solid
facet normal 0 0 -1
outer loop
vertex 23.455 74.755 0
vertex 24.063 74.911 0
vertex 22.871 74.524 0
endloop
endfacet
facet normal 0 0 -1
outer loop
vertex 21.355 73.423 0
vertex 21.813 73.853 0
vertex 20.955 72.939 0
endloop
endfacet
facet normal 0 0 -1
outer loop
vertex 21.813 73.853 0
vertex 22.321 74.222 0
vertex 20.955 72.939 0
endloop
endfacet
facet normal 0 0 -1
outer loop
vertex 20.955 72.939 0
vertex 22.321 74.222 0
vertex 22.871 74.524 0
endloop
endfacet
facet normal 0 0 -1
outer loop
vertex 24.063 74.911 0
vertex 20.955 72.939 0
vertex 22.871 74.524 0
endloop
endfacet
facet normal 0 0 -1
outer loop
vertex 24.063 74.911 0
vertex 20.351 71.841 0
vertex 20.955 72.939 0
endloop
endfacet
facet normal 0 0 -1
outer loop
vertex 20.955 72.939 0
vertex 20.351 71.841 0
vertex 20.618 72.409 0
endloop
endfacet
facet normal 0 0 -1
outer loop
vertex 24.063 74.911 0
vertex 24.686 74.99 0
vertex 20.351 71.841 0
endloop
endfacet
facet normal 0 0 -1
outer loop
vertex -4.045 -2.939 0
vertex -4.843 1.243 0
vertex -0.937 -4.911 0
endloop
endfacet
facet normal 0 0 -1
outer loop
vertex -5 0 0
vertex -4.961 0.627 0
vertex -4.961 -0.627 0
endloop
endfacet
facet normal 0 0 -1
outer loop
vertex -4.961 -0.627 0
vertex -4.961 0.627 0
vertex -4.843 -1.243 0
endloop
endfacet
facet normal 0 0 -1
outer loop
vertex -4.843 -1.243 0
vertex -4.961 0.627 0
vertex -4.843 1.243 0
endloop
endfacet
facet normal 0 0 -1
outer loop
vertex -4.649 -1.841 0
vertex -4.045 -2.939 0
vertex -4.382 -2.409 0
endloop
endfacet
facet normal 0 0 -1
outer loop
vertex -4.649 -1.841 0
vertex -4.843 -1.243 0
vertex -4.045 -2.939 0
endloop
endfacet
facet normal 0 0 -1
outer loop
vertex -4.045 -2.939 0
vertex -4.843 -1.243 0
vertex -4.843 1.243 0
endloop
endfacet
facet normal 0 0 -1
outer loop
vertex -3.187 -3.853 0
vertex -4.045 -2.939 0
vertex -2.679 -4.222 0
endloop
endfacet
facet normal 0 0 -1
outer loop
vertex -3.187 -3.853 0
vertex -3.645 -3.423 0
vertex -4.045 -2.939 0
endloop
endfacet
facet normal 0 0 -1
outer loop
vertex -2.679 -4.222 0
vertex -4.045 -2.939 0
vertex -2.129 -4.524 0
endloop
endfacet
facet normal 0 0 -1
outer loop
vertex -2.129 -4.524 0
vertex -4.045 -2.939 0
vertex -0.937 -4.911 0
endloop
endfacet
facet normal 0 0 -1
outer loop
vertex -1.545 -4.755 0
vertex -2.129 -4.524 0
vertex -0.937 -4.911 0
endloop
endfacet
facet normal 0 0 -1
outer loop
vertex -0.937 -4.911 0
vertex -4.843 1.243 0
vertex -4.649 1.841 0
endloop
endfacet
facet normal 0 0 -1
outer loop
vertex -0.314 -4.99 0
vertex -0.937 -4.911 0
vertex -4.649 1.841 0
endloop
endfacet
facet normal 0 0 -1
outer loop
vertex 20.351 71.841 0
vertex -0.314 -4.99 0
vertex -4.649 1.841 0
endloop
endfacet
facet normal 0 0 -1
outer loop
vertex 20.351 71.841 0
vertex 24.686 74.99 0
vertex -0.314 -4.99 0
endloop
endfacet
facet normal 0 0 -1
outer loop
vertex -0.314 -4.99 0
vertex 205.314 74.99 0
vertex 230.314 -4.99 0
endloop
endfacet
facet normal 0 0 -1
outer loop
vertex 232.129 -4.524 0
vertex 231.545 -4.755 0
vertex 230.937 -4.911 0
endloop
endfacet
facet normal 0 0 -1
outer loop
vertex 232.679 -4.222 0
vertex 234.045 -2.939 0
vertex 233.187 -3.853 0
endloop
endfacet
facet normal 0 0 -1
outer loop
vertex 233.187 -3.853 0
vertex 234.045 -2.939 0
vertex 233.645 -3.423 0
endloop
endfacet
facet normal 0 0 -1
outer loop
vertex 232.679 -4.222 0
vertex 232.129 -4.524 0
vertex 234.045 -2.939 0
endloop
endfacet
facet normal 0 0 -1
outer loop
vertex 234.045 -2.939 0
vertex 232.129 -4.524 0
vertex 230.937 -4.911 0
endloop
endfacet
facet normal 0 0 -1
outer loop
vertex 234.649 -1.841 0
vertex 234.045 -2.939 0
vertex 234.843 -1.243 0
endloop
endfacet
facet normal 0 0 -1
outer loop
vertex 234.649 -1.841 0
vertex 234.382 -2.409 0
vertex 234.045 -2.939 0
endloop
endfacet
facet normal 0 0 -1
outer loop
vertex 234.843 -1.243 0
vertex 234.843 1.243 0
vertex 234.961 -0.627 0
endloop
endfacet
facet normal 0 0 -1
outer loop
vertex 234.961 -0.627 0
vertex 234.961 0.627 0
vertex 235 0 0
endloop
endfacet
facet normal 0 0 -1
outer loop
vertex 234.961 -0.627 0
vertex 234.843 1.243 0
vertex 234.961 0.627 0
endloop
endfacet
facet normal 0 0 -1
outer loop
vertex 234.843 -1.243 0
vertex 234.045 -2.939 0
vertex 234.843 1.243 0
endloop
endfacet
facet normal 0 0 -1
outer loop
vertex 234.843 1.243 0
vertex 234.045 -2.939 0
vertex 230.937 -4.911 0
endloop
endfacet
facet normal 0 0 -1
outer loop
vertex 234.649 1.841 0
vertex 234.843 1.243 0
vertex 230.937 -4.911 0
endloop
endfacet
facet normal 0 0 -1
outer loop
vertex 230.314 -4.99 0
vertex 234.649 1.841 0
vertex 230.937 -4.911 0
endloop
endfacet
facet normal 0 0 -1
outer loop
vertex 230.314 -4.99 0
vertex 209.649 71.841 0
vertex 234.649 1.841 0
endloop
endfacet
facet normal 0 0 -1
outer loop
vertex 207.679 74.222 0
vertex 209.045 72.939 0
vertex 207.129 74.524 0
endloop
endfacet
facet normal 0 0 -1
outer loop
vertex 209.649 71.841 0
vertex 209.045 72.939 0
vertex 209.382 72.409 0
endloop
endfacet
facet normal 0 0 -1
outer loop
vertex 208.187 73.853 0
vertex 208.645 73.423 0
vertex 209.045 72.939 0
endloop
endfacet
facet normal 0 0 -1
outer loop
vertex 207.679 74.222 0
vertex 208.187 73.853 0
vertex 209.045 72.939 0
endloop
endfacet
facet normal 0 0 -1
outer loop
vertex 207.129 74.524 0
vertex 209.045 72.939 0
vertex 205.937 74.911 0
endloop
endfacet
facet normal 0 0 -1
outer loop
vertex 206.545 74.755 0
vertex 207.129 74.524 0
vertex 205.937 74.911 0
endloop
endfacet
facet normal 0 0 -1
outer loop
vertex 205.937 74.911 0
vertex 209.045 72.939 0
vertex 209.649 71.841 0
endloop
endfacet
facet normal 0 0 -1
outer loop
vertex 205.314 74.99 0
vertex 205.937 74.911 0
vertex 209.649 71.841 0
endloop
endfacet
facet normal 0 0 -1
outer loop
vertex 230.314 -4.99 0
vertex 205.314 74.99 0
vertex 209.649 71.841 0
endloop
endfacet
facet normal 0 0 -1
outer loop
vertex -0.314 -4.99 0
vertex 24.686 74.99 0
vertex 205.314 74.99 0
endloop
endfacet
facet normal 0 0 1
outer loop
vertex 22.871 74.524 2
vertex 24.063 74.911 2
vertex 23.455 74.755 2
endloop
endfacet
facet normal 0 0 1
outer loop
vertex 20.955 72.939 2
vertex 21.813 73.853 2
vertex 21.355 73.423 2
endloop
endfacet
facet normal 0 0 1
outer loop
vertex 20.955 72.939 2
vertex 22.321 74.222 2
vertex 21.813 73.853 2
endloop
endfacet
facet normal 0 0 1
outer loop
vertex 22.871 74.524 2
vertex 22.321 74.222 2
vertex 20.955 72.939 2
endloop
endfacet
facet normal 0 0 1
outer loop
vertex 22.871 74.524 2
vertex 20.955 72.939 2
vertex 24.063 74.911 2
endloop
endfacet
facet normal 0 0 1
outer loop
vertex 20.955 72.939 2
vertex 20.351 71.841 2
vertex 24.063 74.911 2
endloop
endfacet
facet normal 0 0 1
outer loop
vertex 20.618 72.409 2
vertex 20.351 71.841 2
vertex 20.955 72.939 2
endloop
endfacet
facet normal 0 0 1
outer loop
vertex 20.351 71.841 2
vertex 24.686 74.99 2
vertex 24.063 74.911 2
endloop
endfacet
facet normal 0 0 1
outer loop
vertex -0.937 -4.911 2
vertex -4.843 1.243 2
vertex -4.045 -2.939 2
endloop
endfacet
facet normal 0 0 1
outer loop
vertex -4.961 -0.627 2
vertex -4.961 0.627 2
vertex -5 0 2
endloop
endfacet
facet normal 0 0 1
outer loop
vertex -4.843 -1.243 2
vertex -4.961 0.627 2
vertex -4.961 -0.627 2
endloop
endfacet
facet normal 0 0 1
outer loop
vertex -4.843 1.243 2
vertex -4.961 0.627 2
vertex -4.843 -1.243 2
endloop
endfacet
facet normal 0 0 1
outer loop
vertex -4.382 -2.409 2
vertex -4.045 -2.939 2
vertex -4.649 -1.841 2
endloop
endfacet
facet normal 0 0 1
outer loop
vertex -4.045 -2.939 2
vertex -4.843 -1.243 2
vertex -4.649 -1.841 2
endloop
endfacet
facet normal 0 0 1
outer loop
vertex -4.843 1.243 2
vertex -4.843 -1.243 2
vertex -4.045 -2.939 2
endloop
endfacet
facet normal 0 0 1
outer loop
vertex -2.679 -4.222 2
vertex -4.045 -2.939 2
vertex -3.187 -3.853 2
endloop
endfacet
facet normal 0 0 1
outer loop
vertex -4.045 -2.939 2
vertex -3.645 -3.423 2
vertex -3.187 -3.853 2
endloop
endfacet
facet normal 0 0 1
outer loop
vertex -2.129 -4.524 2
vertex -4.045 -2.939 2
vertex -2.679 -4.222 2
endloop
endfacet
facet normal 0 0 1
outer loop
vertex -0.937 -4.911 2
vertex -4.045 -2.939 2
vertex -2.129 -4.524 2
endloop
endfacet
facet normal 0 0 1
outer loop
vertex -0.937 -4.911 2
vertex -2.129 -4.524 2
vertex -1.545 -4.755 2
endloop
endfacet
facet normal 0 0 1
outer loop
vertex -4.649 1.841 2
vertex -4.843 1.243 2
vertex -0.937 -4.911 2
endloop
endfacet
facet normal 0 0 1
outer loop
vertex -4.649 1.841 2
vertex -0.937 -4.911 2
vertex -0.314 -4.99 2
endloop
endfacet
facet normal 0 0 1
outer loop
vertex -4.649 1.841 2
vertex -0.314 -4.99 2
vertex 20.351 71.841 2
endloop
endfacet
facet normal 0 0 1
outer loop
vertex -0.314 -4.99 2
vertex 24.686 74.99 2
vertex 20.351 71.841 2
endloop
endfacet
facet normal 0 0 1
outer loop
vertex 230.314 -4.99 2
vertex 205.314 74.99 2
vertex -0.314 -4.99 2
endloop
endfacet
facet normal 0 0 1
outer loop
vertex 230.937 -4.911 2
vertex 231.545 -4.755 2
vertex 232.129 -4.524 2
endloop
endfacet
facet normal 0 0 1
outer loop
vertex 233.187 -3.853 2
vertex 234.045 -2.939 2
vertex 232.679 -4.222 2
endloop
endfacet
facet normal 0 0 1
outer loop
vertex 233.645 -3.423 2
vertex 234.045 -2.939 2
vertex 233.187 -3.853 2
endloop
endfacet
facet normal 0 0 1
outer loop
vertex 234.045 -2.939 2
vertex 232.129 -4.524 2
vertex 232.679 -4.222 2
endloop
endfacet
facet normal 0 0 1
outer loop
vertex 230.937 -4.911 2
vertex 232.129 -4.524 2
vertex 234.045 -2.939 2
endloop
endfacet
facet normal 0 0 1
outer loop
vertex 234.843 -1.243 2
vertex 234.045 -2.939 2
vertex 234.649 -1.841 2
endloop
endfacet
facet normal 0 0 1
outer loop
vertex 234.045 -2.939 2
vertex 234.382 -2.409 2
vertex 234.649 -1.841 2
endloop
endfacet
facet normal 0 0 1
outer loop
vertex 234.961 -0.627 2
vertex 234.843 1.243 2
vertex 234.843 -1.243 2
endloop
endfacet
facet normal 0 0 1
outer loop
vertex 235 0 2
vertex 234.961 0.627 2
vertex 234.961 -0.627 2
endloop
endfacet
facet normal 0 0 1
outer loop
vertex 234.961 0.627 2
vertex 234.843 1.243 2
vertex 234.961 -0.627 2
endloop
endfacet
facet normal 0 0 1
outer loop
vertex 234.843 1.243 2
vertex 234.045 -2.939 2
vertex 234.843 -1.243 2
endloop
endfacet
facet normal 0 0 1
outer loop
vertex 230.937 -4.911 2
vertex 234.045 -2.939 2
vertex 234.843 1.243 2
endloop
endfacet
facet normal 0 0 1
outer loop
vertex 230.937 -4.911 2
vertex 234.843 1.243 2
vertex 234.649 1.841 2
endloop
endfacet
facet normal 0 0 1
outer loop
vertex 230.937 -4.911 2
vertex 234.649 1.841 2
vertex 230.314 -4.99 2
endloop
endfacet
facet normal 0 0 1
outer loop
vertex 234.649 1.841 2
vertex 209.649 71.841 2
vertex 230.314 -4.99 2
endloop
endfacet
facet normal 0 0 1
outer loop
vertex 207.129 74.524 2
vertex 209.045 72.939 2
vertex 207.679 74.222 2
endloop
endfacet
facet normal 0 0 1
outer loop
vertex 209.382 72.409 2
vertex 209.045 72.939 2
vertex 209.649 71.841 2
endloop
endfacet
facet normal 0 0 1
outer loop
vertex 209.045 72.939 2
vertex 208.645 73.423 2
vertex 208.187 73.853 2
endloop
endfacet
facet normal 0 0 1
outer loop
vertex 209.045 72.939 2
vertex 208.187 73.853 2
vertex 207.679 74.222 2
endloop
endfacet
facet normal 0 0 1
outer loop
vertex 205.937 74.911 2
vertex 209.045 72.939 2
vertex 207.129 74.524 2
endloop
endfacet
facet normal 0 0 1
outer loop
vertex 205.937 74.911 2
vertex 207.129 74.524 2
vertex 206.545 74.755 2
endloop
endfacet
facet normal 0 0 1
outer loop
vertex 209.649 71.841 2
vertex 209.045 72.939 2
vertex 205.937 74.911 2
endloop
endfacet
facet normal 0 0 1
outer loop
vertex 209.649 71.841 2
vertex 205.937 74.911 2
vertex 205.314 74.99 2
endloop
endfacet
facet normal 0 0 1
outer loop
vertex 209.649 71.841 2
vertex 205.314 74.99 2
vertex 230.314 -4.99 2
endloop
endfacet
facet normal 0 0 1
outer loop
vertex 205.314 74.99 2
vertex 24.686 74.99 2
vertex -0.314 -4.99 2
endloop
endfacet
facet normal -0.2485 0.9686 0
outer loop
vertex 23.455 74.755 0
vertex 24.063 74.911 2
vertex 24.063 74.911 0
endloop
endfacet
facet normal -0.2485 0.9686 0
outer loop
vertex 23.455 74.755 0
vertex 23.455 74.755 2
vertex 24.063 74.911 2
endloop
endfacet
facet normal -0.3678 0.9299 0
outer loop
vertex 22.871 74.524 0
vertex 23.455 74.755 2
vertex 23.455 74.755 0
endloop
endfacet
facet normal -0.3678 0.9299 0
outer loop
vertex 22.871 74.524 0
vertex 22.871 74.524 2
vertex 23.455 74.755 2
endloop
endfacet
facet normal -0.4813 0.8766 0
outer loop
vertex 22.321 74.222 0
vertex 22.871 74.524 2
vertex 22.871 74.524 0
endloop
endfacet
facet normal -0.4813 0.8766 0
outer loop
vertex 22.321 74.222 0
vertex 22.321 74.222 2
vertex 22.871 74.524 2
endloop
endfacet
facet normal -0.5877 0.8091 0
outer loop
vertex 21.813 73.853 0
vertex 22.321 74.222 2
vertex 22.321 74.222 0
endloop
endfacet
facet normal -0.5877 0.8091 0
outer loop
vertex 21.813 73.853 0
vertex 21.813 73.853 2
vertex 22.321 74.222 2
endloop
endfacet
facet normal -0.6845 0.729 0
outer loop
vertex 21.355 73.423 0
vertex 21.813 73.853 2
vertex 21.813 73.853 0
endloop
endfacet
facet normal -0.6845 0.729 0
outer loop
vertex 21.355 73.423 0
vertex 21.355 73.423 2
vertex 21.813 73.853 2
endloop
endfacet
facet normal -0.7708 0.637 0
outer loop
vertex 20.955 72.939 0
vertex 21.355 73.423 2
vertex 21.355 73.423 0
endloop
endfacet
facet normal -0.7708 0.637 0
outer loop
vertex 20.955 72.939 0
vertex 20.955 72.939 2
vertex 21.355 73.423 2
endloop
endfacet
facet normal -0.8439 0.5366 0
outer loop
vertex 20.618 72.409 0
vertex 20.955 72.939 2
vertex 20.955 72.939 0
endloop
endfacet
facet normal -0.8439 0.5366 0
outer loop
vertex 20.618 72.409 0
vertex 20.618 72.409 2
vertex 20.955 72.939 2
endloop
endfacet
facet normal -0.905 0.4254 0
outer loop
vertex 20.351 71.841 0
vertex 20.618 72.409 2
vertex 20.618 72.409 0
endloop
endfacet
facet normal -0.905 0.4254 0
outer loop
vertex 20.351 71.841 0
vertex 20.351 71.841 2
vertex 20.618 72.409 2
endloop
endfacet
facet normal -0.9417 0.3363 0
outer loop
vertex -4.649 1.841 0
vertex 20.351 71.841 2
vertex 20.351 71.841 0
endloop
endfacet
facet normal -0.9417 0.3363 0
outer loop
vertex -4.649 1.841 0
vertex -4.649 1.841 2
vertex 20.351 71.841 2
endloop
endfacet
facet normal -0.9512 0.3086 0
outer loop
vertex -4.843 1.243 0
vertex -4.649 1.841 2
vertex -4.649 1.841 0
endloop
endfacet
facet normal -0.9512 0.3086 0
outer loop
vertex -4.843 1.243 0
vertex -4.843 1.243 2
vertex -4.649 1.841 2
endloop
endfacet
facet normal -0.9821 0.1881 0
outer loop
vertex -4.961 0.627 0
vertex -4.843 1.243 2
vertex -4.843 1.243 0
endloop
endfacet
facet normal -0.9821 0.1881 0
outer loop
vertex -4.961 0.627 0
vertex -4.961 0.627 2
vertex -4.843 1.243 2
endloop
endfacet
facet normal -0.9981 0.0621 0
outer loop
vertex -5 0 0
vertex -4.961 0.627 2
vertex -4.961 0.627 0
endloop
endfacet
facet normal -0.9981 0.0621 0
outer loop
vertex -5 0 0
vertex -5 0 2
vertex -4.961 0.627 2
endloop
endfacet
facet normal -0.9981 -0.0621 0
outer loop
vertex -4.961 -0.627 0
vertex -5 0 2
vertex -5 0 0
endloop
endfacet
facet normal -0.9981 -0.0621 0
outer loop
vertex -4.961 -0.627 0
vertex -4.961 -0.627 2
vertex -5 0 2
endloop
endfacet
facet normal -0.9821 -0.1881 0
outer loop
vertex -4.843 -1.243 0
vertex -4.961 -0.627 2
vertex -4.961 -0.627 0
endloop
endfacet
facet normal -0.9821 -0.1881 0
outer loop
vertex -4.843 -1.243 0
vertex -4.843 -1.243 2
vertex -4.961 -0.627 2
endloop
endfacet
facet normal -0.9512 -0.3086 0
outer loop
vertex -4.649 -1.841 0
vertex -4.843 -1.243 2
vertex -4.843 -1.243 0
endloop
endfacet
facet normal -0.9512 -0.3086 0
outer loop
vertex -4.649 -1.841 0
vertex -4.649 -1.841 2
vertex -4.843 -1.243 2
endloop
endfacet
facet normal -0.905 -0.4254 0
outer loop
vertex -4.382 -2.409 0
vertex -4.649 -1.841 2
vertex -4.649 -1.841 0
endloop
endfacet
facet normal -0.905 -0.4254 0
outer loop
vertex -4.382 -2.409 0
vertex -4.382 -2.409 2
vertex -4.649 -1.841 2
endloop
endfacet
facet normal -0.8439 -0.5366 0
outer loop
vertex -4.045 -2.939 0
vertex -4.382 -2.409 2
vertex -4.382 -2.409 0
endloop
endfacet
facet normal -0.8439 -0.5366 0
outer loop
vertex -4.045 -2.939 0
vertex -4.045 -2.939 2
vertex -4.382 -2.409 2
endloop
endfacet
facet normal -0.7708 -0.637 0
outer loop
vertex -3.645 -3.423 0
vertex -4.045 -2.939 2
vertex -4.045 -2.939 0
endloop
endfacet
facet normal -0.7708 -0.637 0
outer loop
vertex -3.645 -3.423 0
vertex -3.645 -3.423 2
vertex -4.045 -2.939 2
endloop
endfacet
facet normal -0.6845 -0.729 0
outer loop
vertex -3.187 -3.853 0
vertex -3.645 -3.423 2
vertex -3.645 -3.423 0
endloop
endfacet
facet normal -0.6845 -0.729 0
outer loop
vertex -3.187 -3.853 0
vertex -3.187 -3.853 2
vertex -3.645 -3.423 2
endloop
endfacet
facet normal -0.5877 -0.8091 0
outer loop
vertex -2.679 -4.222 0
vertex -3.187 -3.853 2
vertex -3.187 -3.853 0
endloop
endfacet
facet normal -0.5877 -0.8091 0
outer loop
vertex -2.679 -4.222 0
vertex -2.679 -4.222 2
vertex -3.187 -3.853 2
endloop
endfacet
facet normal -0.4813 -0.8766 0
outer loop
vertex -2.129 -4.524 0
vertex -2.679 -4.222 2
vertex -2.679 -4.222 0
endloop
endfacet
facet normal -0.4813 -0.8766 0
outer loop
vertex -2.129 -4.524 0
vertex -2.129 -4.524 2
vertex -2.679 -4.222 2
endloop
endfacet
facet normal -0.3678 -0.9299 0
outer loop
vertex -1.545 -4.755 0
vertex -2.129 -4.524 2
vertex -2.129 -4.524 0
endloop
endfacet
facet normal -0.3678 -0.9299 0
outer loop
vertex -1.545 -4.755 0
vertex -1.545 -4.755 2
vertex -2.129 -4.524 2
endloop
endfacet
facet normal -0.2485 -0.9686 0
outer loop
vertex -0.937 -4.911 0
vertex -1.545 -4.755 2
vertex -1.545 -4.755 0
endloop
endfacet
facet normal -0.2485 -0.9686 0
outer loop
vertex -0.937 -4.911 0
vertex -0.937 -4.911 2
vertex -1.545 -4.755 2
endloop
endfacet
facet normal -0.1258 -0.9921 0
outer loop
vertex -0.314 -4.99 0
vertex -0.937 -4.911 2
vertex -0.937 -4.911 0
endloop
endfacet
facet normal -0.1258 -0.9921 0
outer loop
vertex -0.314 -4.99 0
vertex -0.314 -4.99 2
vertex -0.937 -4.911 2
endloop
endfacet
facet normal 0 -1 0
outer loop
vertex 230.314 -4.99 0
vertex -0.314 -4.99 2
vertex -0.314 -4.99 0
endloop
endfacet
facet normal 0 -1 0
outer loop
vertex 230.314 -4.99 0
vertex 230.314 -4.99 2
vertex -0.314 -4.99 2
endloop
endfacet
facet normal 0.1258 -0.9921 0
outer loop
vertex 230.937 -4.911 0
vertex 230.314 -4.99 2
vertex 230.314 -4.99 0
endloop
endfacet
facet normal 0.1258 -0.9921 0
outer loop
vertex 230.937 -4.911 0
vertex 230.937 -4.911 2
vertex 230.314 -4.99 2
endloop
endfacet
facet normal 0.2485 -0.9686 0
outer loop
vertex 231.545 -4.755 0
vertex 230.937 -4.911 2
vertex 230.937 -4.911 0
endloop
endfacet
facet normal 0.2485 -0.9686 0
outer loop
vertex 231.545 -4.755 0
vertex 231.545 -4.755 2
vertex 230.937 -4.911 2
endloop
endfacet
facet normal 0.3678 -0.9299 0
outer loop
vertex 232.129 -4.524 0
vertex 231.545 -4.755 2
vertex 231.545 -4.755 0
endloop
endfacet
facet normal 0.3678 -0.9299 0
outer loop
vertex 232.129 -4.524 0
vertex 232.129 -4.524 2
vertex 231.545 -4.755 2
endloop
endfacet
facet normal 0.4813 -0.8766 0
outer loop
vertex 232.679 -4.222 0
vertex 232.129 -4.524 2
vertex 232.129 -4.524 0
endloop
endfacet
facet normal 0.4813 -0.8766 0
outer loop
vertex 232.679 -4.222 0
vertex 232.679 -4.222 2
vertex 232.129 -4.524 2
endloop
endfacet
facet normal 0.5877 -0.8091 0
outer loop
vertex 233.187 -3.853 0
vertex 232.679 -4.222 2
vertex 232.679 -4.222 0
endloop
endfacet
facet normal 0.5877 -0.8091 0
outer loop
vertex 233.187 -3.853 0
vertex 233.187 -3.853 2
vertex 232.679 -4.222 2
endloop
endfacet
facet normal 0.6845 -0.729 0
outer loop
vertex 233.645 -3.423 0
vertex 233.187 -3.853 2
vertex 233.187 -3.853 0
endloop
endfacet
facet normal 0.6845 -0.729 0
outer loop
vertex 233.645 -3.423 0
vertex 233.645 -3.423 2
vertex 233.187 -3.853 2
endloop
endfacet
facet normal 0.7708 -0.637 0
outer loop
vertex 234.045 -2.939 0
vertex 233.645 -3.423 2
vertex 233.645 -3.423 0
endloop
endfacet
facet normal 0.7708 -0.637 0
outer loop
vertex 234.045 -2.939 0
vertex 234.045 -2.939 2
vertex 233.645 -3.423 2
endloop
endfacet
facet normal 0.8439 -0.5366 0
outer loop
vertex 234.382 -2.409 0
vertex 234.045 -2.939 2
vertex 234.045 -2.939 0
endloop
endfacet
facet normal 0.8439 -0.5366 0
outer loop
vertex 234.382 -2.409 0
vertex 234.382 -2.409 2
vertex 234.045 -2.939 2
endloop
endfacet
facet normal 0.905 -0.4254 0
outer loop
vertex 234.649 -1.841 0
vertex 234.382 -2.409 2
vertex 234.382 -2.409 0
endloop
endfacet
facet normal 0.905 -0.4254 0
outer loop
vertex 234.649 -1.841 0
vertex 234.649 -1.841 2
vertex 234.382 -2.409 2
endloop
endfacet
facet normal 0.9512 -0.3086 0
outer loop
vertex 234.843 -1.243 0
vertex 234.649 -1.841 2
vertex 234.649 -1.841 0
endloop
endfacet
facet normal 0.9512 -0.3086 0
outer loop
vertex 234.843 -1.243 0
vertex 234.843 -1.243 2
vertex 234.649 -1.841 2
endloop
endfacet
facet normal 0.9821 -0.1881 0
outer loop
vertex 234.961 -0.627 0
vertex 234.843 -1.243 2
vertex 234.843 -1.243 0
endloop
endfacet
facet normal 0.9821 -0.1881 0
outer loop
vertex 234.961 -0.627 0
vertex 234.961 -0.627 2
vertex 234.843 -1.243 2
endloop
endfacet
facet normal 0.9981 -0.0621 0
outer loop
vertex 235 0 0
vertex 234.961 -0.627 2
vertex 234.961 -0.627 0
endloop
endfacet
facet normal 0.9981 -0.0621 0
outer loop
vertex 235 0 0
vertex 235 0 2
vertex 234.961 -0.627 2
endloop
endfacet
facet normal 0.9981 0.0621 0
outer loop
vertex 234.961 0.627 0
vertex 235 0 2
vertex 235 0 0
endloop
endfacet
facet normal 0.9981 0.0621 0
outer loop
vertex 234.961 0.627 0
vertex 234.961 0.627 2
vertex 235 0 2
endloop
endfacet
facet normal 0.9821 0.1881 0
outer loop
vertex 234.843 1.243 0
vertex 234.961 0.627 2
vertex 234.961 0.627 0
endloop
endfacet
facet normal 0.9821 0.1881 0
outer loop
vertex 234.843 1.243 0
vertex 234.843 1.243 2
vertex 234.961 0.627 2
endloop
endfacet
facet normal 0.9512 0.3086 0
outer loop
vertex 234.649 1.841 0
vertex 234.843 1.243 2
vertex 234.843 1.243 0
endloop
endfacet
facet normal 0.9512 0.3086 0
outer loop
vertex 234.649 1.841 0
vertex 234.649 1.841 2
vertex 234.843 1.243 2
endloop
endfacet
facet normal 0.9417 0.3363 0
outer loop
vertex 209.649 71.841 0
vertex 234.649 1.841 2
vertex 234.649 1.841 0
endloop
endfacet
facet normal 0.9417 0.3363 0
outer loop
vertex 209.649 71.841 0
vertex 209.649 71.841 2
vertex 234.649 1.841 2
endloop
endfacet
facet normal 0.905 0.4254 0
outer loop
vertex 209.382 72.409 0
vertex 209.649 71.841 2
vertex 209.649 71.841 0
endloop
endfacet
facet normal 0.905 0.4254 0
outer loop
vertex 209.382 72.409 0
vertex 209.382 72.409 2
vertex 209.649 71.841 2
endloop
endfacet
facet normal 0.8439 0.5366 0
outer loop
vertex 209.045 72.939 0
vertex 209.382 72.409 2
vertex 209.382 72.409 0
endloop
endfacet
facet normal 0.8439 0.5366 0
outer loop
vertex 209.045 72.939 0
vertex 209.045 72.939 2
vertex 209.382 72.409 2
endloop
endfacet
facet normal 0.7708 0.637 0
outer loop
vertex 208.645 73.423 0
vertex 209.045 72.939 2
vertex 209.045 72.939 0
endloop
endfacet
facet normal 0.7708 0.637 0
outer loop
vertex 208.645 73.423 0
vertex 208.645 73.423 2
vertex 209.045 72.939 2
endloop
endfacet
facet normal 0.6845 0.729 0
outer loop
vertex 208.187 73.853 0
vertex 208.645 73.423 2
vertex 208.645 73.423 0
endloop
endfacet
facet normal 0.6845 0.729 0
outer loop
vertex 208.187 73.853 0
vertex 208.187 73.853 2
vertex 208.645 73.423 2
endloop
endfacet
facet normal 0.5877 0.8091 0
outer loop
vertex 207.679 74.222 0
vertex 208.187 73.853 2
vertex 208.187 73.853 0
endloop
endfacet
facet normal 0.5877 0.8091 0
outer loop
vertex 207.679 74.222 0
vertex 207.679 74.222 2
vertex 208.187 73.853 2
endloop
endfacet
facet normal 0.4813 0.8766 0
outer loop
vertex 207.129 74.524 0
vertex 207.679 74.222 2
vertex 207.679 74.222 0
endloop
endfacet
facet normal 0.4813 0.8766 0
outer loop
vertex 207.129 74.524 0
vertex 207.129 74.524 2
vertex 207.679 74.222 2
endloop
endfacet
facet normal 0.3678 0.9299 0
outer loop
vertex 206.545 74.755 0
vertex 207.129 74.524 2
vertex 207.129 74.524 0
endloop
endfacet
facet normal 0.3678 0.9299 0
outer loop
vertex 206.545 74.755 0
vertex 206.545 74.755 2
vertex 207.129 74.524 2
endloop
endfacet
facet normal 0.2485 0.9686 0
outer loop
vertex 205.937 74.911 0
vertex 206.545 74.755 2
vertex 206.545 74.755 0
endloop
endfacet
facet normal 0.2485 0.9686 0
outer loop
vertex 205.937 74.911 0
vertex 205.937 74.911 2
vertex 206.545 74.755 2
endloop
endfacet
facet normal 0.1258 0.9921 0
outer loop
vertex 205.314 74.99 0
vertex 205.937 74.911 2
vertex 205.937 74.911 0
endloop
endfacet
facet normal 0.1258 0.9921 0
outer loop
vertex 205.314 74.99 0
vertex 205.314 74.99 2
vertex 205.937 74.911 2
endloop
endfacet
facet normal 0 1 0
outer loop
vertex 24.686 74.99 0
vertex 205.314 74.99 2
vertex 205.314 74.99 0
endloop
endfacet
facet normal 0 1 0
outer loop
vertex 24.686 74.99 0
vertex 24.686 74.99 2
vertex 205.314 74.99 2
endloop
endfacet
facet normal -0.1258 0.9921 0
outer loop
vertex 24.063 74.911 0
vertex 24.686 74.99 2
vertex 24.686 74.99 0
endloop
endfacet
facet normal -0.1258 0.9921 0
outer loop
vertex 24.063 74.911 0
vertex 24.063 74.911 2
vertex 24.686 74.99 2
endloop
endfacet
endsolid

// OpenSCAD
/*
 * flight deck platform
 */

$fn=50;

rounding_radius=5;

deck_thickness=2;
deck_width_bottom=240-2*rounding_radius;
deck_width_top=190-2*rounding_radius;
deck_indent=(deck_width_bottom-deck_width_top)/2;
deck_height=80-2*rounding_radius;

deck_polygon=[[0,0], [deck_width_bottom, 0], [deck_width_bottom-deck_indent, deck_height], [deck_indent, deck_height]];


linear_extrude(height=deck_thickness) {
  minkowski() {
      polygon(deck_polygon);
      circle(r=rounding_radius);
   }
}
